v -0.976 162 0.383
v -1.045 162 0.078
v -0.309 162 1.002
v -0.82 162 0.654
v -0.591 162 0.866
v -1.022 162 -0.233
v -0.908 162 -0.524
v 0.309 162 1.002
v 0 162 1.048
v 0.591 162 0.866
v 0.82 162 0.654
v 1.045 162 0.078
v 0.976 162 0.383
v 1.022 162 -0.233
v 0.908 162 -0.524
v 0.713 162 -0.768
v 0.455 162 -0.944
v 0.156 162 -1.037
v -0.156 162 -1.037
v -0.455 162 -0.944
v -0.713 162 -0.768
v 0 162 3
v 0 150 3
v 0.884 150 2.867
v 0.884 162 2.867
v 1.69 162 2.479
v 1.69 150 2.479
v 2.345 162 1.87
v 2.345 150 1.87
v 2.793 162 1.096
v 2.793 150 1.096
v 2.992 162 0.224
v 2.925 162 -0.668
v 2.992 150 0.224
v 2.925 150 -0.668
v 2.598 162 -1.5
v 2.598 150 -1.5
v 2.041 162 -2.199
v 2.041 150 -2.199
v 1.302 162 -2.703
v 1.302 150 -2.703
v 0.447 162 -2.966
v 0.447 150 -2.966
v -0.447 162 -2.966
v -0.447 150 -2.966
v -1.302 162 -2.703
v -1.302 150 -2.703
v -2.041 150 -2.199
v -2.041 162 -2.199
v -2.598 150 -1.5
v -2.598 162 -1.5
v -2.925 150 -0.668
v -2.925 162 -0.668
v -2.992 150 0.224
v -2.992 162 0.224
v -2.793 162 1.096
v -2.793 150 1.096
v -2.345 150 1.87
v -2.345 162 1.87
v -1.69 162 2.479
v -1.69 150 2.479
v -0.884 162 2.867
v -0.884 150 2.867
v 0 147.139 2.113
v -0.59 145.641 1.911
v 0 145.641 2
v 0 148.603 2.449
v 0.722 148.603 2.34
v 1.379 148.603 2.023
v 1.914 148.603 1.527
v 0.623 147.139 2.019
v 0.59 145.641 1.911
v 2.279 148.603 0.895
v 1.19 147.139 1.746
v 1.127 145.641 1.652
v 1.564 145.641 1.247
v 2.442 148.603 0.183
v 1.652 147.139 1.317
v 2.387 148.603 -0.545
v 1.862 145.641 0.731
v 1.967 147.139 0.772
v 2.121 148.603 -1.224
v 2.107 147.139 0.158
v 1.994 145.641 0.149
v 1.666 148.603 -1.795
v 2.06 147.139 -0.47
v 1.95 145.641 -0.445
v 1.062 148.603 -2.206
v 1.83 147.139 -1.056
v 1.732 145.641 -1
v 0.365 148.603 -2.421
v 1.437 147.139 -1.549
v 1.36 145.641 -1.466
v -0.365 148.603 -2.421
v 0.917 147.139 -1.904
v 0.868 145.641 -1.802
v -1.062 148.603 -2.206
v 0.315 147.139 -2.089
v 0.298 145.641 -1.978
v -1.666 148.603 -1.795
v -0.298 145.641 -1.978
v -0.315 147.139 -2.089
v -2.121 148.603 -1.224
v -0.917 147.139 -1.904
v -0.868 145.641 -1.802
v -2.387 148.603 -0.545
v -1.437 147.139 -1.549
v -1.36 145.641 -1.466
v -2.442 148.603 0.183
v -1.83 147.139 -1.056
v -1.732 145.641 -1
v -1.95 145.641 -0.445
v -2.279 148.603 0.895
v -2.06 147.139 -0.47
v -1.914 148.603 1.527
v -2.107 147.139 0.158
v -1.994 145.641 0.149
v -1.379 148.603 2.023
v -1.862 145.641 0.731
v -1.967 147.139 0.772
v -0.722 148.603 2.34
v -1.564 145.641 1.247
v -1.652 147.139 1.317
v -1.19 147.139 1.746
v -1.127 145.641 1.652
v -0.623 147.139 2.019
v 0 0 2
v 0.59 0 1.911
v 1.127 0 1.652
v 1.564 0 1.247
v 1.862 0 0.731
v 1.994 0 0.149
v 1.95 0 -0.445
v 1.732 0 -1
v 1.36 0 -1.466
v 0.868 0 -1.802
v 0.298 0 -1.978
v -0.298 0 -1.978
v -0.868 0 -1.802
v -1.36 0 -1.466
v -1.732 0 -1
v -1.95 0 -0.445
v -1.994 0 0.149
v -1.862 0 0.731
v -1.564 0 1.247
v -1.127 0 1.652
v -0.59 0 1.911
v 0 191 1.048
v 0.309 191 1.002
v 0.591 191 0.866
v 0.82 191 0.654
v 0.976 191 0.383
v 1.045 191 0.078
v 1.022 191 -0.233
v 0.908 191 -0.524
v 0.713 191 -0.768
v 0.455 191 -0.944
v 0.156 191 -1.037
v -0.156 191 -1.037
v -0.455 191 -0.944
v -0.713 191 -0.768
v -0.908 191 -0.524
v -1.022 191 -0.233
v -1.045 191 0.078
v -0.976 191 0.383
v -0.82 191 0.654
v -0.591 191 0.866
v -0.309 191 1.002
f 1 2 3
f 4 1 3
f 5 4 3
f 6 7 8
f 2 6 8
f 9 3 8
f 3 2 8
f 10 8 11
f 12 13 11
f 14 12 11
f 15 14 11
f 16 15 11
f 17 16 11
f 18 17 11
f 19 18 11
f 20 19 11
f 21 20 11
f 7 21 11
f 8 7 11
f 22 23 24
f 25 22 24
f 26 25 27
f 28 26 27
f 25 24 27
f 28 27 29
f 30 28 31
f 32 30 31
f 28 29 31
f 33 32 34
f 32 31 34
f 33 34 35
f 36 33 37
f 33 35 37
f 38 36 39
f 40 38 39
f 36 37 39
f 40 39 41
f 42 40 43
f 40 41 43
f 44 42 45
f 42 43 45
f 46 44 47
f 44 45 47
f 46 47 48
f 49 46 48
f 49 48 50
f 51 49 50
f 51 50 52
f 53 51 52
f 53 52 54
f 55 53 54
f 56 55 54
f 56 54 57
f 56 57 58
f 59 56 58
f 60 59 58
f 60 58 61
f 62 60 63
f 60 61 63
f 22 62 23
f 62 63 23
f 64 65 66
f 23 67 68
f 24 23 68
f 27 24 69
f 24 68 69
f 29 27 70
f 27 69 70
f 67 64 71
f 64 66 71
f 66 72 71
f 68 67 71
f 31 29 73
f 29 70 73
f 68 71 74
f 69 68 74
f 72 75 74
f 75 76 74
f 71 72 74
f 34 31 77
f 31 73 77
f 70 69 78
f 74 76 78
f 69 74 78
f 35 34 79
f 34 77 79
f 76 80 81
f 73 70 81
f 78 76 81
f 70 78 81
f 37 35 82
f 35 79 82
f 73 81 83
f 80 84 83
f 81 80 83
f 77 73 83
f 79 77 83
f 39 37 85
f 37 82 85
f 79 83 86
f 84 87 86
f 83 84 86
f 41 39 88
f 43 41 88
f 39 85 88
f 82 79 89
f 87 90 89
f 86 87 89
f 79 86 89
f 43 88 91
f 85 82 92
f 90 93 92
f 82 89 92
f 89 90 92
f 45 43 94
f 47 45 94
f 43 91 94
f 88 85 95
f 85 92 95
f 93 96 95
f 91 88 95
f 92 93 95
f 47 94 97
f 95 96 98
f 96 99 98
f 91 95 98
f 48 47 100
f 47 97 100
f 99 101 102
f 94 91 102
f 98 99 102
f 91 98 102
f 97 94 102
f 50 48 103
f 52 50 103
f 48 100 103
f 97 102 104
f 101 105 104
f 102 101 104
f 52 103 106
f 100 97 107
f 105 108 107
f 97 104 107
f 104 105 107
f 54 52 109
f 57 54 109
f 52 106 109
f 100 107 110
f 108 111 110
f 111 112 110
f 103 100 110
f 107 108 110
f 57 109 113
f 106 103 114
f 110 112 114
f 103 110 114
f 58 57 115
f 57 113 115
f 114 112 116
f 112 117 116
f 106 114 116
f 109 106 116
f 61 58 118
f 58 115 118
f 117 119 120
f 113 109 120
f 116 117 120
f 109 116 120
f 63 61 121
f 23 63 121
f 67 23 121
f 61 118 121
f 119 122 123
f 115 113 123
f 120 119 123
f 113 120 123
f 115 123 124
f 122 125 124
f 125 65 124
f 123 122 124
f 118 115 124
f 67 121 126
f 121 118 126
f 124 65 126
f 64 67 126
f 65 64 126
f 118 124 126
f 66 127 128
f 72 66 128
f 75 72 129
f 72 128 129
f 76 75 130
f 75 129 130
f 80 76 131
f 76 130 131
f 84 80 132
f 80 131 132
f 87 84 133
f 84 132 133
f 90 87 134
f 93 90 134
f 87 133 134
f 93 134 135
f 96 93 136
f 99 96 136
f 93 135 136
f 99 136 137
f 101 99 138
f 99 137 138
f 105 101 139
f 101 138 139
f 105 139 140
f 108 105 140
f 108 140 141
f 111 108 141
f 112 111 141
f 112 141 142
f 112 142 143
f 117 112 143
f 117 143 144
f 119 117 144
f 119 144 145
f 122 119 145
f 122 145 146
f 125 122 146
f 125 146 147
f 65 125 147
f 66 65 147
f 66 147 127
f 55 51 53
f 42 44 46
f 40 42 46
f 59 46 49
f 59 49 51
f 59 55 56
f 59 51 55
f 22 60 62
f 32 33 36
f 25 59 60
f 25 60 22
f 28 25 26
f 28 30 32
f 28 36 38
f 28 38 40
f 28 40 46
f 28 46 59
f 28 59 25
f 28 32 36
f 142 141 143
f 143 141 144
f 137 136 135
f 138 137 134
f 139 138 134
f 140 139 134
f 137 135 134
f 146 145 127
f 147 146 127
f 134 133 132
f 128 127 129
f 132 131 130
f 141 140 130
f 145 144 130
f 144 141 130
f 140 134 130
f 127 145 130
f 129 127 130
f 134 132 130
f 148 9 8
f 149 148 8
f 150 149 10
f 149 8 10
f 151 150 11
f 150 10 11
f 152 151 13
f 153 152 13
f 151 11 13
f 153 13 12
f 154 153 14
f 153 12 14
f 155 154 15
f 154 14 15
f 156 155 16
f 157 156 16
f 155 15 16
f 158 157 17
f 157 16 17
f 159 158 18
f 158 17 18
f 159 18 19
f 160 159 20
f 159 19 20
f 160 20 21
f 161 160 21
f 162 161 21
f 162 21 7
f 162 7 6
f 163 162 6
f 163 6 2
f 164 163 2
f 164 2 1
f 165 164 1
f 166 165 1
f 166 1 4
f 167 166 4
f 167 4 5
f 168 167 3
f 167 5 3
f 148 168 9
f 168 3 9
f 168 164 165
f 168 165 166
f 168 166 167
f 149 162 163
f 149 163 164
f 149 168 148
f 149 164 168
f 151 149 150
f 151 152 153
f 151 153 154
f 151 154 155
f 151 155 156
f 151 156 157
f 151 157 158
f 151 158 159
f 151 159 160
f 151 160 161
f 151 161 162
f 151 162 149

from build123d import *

# Parameters (mm, degrees)
SKETCH1_R           = 2
BOSS_EXTRUDE1_DEPTH = 150
SKETCH2_R           = 3
BOSS_EXTRUDE2_DEPTH = 12
FILLET1_R           = 10
SKETCH3_R           = 1.048302248
BOSS_EXTRUDE3_DEPTH = 29


with BuildPart() as part:
    # Sketch1 → Boss-Extrude1 (new body)
    with BuildSketch(Plane(origin=(0, 0, 0), x_dir=(1, 0, 0), z_dir=(0, 1, 0))):
        with Locations(Location((0, 0, 0), (0, 0, 270))):
            Circle(SKETCH1_R)
    extrude(amount=BOSS_EXTRUDE1_DEPTH)

    # Sketch2 → Boss-Extrude2 (add)
    with BuildSketch(Plane(origin=(0, 150, 0), x_dir=(1, 0, 0), z_dir=(0, 1, 0))):
        with Locations(Location((0, 0, 0), (0, 0, 270))):
            Circle(SKETCH2_R)
    extrude(amount=BOSS_EXTRUDE2_DEPTH)

    # Fillet1
    # the kernel refuses this fillet: 10 mm, written as the material it adds along each edge
    with BuildSketch(Plane(origin=(0, 150, 0), x_dir=(0, 0, 1), z_dir=(-1, 0, 0))) as fillet1_piece_1:
        with BuildLine():
            CenterArc((12, -4.358898944), FILLET1_R, 154.158067237, 25.841932763)
            Line((2, -4.358898944), (1.8, -4.358898944))
            Line((1.8, -4.358898944), (1.8, 0))
            Line((1.8, 0), (2, 0.2))
            ThreePointArc((2, 0.2), (2.5, 0.2), (2.82, 0.087177979))
            Line((2.82, 0.087177979), (3, 0))
        make_face()
    revolve(axis=Axis((0, 150, 0), (0, 1, 0)))


with BuildPart() as body_2:
    # Sketch3 → Boss-Extrude3 (new body)
    with BuildSketch(Plane(origin=(0, 162, 0), x_dir=(1, 0, 0), z_dir=(0, 1, 0))):
        with Locations(Location((0, 0, 0), (0, 0, 270))):
            Circle(SKETCH3_R)
    extrude(amount=BOSS_EXTRUDE3_DEPTH)


solid = Compound([part.part, body_2.part])
